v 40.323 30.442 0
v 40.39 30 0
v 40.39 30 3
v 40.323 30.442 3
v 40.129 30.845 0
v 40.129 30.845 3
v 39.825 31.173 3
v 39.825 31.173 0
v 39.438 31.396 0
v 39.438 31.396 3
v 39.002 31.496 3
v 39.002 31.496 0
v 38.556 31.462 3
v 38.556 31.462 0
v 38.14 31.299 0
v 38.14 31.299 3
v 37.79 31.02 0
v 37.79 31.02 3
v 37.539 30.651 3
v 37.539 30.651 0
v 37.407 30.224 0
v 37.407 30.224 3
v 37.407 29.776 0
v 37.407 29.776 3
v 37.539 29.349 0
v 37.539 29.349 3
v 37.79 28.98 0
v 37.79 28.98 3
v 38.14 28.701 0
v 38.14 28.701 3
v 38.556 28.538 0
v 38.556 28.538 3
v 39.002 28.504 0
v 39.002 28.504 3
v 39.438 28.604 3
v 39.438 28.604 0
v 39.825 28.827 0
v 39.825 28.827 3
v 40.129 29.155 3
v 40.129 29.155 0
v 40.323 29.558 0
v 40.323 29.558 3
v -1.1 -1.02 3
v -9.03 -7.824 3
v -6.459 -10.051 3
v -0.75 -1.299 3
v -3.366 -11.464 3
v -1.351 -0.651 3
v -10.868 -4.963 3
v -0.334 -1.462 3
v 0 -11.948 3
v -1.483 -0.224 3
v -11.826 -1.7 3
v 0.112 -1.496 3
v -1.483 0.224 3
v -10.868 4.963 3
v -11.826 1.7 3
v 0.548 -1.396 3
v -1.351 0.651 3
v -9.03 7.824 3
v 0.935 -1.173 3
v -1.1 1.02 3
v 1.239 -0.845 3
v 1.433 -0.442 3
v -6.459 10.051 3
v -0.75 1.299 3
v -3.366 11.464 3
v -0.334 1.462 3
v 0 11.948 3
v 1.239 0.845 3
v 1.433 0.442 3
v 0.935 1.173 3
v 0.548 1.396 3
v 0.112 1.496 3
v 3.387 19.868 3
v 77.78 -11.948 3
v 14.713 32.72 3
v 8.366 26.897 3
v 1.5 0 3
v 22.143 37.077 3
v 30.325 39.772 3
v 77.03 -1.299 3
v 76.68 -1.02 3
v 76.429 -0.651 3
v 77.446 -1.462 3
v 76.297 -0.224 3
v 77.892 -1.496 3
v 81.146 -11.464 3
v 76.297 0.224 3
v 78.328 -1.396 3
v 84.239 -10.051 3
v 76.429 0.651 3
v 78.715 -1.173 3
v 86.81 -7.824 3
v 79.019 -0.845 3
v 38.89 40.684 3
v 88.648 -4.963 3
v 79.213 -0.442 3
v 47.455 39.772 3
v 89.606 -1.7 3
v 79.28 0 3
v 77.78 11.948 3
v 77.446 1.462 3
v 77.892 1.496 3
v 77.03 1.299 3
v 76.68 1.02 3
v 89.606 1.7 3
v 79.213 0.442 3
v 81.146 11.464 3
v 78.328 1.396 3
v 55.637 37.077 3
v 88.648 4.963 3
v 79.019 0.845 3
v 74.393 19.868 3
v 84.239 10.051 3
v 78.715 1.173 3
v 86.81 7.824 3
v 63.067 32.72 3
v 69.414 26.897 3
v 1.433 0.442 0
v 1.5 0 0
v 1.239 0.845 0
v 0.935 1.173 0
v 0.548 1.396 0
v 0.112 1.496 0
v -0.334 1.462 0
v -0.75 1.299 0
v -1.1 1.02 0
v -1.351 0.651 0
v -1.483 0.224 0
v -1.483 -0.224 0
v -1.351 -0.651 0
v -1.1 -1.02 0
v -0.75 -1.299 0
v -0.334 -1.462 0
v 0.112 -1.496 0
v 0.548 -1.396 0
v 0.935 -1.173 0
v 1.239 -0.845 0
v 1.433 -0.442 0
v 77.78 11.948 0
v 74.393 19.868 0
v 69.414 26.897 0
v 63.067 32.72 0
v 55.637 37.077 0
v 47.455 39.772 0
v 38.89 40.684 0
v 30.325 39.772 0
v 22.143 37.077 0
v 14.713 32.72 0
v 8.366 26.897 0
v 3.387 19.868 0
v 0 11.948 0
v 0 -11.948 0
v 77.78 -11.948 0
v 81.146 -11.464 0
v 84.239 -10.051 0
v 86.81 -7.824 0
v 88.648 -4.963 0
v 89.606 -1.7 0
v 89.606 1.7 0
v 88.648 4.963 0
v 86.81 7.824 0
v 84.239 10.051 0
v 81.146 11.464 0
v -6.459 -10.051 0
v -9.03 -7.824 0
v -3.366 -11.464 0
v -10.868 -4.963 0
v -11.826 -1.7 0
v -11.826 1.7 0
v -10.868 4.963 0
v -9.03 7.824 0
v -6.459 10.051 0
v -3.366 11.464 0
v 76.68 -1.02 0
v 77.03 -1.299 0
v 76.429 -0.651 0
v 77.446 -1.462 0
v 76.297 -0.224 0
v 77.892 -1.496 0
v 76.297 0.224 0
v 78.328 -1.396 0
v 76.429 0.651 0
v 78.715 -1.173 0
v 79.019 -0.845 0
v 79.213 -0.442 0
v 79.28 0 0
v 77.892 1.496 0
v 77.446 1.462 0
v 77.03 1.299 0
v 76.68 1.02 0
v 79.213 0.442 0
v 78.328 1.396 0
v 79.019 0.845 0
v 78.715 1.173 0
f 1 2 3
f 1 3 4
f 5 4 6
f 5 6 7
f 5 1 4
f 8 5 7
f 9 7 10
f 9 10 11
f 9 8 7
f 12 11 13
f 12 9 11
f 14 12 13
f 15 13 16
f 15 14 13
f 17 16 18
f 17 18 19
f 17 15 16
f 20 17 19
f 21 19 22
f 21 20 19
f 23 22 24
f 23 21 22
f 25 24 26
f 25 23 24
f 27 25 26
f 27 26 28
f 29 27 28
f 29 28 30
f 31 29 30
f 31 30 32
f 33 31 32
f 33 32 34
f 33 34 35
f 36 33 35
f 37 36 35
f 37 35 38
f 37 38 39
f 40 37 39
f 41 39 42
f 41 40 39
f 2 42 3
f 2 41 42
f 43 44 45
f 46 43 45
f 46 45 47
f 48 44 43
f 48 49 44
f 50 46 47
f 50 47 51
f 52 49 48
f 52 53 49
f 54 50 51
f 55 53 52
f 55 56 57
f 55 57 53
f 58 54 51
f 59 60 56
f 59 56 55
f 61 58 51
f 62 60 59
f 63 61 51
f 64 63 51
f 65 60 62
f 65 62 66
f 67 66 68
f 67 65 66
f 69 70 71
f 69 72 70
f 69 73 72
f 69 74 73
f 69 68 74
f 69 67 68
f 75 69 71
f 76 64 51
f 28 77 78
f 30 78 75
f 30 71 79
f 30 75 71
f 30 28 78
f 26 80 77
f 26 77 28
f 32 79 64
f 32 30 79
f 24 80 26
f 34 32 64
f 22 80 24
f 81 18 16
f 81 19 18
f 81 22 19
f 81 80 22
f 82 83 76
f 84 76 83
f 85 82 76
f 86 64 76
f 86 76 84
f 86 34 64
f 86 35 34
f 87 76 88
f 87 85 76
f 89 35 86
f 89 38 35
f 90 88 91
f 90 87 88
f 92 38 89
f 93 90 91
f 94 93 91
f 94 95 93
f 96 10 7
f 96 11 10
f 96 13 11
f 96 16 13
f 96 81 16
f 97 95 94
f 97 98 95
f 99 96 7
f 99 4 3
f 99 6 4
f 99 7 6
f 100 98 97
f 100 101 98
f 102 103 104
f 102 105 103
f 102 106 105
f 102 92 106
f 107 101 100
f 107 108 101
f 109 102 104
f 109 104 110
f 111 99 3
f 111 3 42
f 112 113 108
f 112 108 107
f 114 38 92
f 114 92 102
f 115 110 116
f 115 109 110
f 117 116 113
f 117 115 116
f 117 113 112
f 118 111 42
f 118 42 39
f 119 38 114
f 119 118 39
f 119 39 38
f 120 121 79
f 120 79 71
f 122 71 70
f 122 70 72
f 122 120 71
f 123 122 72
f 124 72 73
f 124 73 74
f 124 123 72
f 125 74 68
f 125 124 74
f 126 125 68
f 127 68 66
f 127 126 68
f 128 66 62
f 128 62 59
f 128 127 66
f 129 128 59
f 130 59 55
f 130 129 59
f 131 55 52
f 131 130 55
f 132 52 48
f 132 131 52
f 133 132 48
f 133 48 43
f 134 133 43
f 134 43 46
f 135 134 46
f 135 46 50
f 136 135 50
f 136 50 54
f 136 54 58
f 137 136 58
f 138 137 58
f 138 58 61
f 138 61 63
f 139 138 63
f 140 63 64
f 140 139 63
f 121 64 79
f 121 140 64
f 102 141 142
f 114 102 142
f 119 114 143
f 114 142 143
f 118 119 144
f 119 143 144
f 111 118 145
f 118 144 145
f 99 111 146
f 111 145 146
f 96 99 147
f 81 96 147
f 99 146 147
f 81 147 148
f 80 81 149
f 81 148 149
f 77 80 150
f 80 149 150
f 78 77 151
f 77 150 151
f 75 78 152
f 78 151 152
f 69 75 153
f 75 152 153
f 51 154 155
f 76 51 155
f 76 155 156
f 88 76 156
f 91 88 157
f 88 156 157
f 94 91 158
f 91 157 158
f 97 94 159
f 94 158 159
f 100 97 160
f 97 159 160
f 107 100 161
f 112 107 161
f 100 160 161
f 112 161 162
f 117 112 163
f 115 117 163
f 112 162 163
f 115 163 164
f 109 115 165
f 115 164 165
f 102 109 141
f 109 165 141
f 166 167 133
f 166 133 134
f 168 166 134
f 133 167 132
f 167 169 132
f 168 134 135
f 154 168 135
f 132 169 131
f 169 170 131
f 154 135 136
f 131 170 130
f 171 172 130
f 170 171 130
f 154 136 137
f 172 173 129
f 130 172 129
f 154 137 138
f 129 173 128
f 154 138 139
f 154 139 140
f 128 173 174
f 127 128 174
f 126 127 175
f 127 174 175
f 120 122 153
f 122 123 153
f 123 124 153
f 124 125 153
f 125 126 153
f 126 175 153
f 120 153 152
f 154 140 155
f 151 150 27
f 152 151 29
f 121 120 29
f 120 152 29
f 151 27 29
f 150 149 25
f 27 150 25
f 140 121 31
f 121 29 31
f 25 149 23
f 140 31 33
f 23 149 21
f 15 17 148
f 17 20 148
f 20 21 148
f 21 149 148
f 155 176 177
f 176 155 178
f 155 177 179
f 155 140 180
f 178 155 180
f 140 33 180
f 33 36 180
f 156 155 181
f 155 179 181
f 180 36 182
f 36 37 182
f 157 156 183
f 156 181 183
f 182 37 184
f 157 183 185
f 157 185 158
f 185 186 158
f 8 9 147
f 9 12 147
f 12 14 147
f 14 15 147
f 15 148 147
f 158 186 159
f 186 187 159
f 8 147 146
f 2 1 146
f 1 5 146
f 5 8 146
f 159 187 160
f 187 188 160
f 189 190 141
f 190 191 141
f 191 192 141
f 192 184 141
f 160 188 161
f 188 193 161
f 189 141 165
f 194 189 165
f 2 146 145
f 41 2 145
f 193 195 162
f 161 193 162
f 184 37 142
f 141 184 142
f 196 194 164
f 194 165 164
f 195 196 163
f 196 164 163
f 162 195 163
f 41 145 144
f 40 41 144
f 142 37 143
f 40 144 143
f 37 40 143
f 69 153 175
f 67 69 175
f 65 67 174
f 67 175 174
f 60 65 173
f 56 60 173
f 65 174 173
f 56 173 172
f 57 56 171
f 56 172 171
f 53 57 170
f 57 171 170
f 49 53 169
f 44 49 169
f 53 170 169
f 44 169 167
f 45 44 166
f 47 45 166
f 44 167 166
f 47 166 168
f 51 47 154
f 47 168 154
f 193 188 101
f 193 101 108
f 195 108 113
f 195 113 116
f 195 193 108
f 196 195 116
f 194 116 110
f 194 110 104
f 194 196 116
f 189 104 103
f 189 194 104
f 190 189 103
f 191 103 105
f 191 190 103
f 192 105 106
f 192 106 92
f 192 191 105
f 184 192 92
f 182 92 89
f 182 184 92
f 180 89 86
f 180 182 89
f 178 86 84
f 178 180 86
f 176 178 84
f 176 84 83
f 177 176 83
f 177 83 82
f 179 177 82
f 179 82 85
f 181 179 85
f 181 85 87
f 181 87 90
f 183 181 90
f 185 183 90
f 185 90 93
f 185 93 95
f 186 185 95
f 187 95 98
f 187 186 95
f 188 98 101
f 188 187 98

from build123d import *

# Parameters (mm, degrees)
CROQUIS1_R              = 1.5
SALIENTE_EXTRUIR1_DEPTH = 3


with BuildPart() as part:
    # Croquis1 → Saliente-Extruir1 (new body)
    with BuildSketch(Plane.XY):
        with BuildLine():
            Line((0, -11.947743298), (77.78, -11.947743298))
            ThreePointArc((77.78, -11.947743298), (89.727743298, 0), (77.78, 11.947743298))
            ThreePointArc((77.78, 11.947743298), (38.89, 40.683911684), (0, 11.947743298))
            ThreePointArc((0, 11.947743298), (-11.947743298, 0), (0, -11.947743298))
        make_face()
        Circle(CROQUIS1_R, mode=Mode.SUBTRACT)
        with Locations((77.78, 0)):
            Circle(CROQUIS1_R, mode=Mode.SUBTRACT)
        with Locations((38.89, 30)):
            Circle(CROQUIS1_R, mode=Mode.SUBTRACT)
    extrude(amount=SALIENTE_EXTRUIR1_DEPTH)


solid = part.part
